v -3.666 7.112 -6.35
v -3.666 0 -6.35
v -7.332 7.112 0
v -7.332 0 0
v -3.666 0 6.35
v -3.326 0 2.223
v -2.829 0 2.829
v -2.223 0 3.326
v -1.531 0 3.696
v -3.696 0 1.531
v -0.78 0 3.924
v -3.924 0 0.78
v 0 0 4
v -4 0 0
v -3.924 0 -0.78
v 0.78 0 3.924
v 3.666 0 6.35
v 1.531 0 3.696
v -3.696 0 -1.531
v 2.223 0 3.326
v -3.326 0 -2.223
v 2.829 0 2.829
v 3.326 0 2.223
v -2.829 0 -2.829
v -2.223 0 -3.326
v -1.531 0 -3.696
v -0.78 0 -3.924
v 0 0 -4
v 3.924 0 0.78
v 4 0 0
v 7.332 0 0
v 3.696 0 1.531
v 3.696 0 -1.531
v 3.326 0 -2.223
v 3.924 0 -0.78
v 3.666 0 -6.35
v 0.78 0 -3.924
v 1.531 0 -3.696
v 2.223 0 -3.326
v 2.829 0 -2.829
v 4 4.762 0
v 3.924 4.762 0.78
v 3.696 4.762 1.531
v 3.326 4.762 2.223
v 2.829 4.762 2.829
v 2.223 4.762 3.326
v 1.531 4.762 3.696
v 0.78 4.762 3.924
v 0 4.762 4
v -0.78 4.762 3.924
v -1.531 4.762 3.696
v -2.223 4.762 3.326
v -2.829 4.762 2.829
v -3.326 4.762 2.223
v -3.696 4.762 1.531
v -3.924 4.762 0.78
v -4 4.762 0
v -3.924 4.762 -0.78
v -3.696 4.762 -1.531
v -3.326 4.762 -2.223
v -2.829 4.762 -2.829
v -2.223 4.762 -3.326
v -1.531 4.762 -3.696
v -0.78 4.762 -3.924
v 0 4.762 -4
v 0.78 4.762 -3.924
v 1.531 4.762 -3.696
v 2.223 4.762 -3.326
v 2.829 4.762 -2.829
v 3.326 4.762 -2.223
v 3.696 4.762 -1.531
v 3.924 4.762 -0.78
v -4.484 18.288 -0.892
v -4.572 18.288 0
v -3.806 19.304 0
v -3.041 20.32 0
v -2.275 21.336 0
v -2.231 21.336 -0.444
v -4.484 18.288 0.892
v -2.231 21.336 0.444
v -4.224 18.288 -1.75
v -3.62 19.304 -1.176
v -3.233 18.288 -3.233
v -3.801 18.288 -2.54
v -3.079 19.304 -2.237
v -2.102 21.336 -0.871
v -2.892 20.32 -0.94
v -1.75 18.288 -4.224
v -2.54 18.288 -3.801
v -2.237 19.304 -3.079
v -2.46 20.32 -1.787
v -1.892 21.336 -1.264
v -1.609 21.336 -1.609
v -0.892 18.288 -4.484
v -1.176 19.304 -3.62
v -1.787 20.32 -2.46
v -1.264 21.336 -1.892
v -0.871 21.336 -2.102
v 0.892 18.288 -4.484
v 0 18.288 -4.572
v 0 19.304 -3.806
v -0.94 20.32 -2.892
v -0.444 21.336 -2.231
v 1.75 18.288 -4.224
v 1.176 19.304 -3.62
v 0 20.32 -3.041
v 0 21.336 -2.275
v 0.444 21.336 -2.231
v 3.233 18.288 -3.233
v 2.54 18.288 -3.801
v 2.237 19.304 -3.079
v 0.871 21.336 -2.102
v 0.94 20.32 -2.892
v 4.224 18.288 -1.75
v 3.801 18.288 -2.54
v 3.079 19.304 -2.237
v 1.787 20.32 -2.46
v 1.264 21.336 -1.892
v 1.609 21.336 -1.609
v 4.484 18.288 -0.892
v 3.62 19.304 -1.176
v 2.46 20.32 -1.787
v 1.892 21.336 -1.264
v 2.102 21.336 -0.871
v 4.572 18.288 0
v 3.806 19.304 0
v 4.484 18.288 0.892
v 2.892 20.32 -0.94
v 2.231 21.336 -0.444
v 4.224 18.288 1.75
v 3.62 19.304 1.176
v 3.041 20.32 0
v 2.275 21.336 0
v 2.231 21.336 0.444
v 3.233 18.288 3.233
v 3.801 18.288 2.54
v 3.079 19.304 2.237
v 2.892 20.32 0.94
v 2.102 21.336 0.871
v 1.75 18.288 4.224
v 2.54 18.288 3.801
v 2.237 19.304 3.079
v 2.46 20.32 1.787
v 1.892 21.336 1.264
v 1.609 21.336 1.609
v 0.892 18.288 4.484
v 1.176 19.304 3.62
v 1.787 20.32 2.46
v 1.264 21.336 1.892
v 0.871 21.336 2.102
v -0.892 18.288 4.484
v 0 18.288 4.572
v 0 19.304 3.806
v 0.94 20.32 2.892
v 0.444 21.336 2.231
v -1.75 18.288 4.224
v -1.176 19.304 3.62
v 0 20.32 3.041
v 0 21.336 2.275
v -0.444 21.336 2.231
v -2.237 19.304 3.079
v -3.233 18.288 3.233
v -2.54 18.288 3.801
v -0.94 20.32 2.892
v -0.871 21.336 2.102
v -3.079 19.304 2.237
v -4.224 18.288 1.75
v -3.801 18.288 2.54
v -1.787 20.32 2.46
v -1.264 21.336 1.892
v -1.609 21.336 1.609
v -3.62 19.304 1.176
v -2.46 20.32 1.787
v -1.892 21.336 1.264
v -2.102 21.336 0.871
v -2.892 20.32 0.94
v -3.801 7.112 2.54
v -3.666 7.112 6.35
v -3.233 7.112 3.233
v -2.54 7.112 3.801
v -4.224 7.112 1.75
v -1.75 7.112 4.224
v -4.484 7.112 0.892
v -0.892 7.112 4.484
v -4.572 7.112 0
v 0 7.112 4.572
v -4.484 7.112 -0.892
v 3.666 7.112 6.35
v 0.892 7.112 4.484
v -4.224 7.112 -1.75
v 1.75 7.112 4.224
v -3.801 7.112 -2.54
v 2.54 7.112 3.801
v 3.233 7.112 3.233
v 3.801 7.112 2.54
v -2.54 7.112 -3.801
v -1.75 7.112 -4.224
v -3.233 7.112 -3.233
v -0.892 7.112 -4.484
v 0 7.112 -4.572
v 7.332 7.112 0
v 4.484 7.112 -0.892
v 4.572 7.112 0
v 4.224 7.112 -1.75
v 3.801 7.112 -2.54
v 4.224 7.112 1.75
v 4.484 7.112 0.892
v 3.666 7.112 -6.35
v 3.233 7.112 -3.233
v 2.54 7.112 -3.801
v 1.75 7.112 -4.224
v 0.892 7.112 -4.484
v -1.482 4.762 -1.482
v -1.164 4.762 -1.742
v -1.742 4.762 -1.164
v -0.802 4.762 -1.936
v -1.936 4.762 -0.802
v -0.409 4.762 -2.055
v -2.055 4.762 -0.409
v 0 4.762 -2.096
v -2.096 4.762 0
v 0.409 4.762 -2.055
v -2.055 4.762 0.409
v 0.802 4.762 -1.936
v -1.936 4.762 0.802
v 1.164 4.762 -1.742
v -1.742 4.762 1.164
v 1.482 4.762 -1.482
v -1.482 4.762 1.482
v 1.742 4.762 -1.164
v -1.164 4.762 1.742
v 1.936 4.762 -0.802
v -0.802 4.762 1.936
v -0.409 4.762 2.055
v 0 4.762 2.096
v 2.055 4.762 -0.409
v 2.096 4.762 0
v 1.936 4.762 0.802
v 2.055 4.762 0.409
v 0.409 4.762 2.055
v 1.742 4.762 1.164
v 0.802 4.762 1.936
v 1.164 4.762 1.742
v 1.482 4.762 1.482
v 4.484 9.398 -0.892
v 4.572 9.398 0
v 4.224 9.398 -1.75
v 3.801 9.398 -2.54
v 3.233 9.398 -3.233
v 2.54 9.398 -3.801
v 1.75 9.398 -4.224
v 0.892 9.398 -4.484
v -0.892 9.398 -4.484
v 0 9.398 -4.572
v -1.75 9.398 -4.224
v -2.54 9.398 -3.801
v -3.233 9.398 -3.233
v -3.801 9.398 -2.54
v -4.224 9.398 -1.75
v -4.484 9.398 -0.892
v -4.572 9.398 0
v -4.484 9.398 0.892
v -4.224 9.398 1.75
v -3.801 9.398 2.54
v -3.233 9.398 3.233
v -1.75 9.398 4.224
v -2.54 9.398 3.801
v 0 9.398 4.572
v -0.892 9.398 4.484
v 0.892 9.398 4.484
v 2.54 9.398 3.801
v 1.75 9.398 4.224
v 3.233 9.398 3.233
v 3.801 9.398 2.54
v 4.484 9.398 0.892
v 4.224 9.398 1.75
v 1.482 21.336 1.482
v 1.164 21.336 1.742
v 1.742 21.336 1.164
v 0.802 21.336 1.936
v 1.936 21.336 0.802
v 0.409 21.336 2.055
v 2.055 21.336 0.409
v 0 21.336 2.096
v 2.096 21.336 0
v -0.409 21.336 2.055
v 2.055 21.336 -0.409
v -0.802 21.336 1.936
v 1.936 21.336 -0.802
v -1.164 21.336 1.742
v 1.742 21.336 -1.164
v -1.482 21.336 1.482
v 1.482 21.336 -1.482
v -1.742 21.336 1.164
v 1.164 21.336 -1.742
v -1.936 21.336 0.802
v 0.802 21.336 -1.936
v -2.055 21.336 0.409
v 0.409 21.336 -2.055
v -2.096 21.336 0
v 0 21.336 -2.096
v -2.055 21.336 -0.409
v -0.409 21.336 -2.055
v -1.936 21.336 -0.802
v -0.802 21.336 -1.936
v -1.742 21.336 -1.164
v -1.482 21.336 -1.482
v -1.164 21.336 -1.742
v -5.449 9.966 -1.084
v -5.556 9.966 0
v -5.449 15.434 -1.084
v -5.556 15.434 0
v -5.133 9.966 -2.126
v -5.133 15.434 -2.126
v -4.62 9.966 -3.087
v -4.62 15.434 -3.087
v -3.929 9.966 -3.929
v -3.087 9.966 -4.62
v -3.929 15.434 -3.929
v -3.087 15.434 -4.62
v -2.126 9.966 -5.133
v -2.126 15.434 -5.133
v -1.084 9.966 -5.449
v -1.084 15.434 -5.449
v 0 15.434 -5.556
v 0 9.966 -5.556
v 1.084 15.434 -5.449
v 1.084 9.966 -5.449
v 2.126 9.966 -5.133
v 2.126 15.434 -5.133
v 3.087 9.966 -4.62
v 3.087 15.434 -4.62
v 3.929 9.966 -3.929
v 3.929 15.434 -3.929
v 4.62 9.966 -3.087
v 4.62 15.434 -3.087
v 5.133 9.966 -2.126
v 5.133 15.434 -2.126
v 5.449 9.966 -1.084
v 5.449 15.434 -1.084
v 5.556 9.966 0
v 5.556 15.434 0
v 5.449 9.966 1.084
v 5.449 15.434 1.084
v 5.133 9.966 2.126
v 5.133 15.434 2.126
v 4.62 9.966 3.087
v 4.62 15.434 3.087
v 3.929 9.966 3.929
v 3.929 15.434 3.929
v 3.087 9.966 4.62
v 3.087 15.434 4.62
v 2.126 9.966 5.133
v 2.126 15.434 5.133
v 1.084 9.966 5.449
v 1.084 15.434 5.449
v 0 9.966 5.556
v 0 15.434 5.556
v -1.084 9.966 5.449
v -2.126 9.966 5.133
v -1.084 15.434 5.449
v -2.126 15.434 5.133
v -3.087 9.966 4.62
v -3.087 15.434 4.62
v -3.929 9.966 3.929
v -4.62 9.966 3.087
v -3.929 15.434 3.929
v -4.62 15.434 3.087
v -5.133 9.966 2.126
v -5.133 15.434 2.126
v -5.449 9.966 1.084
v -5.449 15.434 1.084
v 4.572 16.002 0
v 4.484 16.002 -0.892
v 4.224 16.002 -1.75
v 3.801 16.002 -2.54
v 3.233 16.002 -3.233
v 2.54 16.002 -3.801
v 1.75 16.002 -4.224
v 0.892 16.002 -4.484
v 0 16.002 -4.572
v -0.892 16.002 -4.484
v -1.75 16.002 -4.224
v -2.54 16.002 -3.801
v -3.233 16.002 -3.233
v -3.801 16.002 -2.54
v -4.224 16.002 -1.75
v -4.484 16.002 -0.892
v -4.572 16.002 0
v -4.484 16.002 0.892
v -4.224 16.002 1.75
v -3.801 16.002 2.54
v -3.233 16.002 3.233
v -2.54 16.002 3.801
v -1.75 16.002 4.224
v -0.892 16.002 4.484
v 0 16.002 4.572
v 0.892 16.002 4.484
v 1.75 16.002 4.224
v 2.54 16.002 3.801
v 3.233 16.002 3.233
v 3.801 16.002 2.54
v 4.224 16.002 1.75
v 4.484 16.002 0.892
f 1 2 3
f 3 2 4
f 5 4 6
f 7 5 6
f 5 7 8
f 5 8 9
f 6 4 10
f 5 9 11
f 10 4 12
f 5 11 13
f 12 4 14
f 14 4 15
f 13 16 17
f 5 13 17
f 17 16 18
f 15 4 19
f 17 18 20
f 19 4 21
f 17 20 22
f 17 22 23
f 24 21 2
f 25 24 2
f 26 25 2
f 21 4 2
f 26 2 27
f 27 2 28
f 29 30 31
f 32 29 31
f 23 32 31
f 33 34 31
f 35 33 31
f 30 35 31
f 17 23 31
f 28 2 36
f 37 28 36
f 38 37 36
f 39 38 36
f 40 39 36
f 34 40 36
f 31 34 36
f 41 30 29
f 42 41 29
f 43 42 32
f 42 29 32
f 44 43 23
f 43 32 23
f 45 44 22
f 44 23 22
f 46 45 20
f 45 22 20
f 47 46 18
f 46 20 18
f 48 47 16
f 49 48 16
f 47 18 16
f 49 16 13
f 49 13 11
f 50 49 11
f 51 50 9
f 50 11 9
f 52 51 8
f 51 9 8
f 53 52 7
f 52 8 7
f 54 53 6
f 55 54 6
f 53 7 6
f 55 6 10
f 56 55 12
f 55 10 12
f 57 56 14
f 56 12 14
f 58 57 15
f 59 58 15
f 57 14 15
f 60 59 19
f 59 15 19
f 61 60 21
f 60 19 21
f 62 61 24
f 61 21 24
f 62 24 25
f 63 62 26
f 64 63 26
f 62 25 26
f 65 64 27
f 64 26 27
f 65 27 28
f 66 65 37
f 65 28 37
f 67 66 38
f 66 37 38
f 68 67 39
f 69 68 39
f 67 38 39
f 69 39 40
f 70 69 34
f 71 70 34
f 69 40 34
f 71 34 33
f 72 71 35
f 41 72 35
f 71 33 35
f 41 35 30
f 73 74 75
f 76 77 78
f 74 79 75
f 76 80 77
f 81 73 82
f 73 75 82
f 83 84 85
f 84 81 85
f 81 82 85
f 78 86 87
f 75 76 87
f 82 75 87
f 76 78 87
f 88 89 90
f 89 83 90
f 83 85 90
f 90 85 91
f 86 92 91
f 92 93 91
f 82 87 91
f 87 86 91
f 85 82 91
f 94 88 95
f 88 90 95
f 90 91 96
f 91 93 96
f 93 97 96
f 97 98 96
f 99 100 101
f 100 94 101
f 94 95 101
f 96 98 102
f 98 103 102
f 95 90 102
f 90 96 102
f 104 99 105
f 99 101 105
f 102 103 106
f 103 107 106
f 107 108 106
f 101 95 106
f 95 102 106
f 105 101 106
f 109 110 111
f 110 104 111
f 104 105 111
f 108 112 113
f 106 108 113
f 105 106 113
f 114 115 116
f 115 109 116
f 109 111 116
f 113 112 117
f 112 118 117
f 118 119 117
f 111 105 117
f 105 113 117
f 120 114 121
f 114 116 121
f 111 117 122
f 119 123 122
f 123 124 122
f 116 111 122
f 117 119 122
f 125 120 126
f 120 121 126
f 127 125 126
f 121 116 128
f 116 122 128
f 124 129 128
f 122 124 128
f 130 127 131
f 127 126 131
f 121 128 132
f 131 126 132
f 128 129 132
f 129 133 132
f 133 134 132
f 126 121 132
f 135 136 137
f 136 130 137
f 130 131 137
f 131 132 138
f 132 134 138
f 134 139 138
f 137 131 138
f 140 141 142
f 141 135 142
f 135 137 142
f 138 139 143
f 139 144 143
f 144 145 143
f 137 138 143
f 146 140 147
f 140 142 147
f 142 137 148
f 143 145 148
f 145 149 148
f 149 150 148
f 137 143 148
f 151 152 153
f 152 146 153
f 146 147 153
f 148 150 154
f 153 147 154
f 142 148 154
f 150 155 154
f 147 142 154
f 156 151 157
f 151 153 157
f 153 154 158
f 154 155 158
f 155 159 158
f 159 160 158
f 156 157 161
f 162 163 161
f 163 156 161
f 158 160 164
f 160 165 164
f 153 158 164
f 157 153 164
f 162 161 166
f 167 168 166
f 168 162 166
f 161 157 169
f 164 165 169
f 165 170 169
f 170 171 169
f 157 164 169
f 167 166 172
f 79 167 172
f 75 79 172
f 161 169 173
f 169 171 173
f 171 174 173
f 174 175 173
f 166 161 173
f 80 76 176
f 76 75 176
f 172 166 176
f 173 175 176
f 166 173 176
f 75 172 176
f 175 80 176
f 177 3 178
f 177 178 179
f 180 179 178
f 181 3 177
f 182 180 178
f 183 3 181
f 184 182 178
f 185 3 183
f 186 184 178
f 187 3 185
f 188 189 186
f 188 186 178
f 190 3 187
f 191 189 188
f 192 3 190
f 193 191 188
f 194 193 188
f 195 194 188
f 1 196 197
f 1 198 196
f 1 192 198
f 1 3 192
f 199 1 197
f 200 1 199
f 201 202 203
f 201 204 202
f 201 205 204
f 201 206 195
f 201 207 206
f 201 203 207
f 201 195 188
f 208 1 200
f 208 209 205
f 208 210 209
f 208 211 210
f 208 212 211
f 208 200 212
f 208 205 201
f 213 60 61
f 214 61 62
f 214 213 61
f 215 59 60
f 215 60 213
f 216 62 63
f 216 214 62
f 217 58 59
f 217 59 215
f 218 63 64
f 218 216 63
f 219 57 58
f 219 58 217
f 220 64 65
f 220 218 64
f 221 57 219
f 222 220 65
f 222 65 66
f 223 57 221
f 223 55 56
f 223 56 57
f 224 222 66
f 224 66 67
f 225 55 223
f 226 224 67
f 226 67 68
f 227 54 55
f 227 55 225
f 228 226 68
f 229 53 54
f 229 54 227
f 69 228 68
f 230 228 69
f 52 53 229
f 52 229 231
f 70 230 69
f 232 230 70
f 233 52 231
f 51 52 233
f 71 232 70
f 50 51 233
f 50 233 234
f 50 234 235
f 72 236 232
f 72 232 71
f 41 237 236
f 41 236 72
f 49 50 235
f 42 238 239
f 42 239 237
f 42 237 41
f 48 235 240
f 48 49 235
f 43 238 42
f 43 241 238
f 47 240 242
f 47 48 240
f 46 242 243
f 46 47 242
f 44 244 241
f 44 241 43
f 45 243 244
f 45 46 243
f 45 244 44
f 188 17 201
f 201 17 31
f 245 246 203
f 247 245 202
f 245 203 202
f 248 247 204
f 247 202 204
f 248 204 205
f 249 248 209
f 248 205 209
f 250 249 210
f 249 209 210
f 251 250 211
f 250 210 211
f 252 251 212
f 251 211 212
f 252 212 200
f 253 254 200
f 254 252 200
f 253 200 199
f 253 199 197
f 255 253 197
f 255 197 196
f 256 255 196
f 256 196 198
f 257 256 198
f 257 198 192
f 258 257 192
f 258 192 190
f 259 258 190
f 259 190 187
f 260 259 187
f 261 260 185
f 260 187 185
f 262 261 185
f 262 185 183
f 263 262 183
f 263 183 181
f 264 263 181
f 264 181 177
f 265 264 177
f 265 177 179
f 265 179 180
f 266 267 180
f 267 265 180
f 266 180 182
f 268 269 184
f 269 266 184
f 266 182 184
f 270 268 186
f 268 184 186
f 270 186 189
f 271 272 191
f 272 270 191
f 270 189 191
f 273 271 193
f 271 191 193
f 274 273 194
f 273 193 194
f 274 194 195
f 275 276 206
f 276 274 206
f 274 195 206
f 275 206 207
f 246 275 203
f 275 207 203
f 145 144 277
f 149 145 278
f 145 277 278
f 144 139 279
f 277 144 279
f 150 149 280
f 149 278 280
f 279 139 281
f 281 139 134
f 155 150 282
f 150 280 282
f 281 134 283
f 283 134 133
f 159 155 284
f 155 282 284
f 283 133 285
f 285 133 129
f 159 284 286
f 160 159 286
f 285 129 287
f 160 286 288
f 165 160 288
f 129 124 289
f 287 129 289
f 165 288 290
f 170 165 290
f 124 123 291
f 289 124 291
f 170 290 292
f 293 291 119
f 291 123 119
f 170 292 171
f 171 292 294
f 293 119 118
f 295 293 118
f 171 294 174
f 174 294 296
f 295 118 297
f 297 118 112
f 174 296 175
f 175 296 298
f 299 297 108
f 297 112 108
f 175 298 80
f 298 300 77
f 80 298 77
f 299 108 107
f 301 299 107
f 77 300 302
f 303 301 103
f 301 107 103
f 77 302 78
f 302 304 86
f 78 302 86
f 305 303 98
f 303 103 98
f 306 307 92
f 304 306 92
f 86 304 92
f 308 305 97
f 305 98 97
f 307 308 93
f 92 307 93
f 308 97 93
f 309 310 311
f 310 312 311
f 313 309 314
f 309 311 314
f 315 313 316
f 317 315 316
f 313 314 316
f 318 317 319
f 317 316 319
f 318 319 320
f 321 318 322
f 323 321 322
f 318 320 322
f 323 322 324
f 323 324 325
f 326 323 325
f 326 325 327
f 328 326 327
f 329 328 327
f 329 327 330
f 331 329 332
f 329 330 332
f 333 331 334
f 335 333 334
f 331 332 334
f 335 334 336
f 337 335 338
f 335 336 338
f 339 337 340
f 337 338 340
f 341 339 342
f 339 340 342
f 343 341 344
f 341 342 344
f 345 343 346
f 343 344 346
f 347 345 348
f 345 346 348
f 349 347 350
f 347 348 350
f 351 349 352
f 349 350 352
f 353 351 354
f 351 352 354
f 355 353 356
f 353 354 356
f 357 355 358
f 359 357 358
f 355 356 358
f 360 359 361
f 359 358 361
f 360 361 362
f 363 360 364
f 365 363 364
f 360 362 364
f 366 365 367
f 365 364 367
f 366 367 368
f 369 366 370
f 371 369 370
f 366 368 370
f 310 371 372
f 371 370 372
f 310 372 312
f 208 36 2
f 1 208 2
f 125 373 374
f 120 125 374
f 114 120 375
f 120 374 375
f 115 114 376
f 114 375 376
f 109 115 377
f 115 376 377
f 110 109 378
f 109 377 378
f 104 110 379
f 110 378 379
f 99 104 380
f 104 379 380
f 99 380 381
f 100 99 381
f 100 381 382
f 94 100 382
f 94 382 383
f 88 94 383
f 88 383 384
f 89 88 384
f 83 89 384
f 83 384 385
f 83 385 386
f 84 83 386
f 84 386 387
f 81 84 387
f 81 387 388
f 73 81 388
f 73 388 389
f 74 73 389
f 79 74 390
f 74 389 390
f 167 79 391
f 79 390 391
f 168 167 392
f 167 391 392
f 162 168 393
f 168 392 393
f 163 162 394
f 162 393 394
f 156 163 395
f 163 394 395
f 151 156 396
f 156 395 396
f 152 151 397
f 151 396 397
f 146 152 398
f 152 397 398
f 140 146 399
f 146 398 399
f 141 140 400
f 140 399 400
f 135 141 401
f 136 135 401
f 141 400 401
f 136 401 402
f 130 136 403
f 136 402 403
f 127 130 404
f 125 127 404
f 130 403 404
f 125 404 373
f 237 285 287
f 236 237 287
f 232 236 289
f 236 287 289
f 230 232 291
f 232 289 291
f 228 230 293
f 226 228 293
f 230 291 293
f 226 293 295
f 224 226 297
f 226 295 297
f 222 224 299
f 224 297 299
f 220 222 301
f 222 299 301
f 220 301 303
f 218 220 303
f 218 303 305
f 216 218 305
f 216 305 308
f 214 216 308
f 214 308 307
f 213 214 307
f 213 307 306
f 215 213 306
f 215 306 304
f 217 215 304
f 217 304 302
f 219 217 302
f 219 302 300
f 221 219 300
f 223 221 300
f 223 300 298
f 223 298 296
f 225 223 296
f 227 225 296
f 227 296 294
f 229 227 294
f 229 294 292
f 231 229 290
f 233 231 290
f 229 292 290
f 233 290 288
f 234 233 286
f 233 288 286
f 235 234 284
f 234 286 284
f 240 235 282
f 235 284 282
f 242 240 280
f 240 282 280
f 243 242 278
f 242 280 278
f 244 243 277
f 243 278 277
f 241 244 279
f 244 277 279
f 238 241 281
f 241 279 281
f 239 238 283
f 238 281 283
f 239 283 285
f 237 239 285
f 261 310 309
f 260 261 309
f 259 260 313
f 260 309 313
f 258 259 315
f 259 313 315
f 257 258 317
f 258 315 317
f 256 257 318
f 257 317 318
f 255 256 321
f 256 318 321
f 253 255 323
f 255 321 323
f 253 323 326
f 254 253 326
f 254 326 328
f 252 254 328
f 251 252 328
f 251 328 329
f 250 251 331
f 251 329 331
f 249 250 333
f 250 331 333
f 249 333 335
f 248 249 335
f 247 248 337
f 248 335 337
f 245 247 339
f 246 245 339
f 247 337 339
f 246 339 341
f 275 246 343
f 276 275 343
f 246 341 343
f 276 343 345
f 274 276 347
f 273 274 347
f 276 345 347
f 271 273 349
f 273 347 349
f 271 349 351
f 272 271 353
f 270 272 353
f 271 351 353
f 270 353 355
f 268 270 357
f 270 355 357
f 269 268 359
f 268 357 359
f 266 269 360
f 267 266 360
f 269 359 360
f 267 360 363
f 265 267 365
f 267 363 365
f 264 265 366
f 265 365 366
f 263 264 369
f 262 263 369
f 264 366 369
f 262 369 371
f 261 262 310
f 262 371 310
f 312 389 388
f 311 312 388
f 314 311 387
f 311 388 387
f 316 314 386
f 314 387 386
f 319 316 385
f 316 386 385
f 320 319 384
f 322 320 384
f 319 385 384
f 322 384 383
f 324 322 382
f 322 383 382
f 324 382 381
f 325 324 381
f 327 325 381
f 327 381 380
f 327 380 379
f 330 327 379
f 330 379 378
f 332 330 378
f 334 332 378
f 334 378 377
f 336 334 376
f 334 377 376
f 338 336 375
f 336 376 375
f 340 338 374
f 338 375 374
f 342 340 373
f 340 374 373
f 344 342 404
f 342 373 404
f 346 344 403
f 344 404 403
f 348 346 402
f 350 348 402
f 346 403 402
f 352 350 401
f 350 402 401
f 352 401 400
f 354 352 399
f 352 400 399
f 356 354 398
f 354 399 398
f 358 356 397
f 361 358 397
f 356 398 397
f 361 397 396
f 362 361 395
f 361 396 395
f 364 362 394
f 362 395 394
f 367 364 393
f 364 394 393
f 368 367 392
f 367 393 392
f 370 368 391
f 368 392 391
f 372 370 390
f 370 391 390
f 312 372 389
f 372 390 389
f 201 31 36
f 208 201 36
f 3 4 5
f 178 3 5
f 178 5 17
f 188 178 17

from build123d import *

# Parameters (mm, degrees)
BOSS_EXTRUDE1_DEPTH = 7.112
SKETCH2_R           = 4.572
BOSS_EXTRUDE2_DEPTH = 11.176
SKETCH4_R           = 4.0005
CUT_EXTRUDE1_DEPTH  = 4.7625
SKETCH5_R           = 2.0955
CUT_EXTRUDE2_DEPTH  = 22.336


with BuildPart() as part:
    # Sketch1 → Boss-Extrude1 (new body)
    with BuildSketch(Plane(origin=(0, 0, 0), x_dir=(1, 0, 0), z_dir=(0, 1, 0))):
        Polygon((7.332348419, 0), (3.666174209, 6.35), (-3.666174209, 6.35), (-7.332348419, 0), (-3.666174209, -6.35), (3.666174209, -6.35), align=None)
    extrude(amount=BOSS_EXTRUDE1_DEPTH)

    # Sketch2 → Boss-Extrude2 (add)
    with BuildSketch(Plane(origin=(0, 7.112, 0), x_dir=(1, 0, 0), z_dir=(0, 1, 0))):
        Circle(SKETCH2_R)
    extrude(amount=BOSS_EXTRUDE2_DEPTH)

    # Sketch3 → Revolve1 (revolve)
    with BuildSketch(Plane.XY):
        Polygon((0, 18.288), (-4.572, 18.288), (-2.275167255, 21.336), (0, 21.336), align=None)
    revolve(axis=Axis((0, 24.854353551, 0), (0, -1, 0)))

    # Sketch4 → Cut-Extrude1 (cut)
    with BuildSketch(Plane.XZ):
        Circle(SKETCH4_R)
    extrude(amount=-CUT_EXTRUDE1_DEPTH, mode=Mode.SUBTRACT)

    # Sketch5 → Cut-Extrude2 (cut, through all)
    with BuildSketch(Plane(origin=(0, 21.336, 0), x_dir=(1, 0, 0), z_dir=(0, 1, 0))):
        Circle(SKETCH5_R)
    extrude(amount=-CUT_EXTRUDE2_DEPTH, mode=Mode.SUBTRACT)

    # Sketch7 → Revolve2 (revolve)
    with BuildSketch(Plane.XY):
        Polygon((-4.572, 9.398), (-5.55625, 9.966257002), (-5.55625, 15.433742998), (-4.572, 16.002), align=None)
    revolve(axis=Axis((0, 22.381556864, 0), (0, -1, 0)))


solid = part.part
